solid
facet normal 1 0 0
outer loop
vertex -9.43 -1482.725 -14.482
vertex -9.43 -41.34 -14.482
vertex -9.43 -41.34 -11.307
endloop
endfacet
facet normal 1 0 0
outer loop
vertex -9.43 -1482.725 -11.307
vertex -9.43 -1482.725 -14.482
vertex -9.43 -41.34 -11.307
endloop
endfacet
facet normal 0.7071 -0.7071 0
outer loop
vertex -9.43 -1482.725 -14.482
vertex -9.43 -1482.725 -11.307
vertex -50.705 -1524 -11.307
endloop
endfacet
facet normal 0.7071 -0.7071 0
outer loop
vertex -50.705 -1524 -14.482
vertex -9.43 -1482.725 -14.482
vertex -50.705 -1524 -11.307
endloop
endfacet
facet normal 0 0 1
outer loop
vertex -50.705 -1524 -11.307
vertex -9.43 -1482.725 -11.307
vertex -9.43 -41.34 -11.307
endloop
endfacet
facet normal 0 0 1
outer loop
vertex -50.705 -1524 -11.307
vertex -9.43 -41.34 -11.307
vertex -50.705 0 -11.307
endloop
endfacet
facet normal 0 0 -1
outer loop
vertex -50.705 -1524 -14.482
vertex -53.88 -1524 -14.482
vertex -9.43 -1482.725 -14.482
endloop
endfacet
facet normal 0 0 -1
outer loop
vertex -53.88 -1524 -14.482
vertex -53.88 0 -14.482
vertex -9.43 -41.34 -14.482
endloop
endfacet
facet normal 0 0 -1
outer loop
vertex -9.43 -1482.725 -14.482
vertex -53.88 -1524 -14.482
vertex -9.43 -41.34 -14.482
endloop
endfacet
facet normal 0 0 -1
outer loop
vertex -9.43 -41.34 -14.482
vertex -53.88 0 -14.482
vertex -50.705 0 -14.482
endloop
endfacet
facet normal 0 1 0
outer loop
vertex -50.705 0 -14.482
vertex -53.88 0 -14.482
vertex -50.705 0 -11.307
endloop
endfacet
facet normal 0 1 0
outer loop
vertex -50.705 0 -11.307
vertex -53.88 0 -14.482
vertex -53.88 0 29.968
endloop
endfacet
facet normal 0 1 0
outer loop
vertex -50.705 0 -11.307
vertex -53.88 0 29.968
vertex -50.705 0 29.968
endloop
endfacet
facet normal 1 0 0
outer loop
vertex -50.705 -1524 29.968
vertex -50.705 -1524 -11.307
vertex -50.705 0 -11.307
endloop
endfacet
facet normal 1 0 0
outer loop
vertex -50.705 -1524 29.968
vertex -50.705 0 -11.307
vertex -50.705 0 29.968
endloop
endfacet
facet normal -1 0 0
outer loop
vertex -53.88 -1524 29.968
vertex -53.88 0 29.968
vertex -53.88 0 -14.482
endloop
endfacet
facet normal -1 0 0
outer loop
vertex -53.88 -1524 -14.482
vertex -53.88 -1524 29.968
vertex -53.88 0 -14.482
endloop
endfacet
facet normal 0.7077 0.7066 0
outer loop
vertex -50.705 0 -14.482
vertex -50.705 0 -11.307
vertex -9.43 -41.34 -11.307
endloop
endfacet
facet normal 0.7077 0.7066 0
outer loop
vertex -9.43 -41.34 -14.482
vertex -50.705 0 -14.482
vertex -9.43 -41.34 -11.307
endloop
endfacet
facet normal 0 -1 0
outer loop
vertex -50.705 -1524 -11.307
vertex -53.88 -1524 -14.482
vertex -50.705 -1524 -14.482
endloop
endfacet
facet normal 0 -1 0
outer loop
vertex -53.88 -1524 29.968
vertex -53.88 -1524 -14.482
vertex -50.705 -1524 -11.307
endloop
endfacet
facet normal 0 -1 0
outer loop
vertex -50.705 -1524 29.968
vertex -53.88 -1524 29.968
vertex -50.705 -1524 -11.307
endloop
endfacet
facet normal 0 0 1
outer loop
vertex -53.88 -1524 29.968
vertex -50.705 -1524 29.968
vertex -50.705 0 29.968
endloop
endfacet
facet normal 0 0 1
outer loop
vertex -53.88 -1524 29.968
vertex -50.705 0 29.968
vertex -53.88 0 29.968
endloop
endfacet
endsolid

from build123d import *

# Parameters (mm, degrees)
F1_DEPTH = 1524
F3_DEPTH = 25.4
F5_DEPTH = 25.4


with BuildPart() as f1:
    # F0 (on Front) → F1 (new body)
    with BuildSketch(Plane.XZ):
        Polygon((-50.705169, 29.967905), (-53.880169, 29.967905), (-53.880169, -14.482095), (-9.430169, -14.482095), (-9.430169, -11.307095), (-50.705169, -11.307095), align=None)
    extrude(amount=F1_DEPTH)

    # F2 (on face) → F3 (cut)
    with BuildSketch(Plane.XY.offset(-11.307095)):
        Polygon((-50.705169, 0), (-9.430169, -41.340452), (-9.430169, 0), align=None)
    extrude(amount=-F3_DEPTH, mode=Mode.SUBTRACT)

    # F4 (on face) → F5 (cut)
    with BuildSketch(Plane.XY.offset(-11.307095)):
        Polygon((-9.430169, -1524), (-9.430169, -1482.725), (-50.705169, -1524), align=None)
    extrude(amount=-F5_DEPTH, mode=Mode.SUBTRACT)


solid = f1.part
